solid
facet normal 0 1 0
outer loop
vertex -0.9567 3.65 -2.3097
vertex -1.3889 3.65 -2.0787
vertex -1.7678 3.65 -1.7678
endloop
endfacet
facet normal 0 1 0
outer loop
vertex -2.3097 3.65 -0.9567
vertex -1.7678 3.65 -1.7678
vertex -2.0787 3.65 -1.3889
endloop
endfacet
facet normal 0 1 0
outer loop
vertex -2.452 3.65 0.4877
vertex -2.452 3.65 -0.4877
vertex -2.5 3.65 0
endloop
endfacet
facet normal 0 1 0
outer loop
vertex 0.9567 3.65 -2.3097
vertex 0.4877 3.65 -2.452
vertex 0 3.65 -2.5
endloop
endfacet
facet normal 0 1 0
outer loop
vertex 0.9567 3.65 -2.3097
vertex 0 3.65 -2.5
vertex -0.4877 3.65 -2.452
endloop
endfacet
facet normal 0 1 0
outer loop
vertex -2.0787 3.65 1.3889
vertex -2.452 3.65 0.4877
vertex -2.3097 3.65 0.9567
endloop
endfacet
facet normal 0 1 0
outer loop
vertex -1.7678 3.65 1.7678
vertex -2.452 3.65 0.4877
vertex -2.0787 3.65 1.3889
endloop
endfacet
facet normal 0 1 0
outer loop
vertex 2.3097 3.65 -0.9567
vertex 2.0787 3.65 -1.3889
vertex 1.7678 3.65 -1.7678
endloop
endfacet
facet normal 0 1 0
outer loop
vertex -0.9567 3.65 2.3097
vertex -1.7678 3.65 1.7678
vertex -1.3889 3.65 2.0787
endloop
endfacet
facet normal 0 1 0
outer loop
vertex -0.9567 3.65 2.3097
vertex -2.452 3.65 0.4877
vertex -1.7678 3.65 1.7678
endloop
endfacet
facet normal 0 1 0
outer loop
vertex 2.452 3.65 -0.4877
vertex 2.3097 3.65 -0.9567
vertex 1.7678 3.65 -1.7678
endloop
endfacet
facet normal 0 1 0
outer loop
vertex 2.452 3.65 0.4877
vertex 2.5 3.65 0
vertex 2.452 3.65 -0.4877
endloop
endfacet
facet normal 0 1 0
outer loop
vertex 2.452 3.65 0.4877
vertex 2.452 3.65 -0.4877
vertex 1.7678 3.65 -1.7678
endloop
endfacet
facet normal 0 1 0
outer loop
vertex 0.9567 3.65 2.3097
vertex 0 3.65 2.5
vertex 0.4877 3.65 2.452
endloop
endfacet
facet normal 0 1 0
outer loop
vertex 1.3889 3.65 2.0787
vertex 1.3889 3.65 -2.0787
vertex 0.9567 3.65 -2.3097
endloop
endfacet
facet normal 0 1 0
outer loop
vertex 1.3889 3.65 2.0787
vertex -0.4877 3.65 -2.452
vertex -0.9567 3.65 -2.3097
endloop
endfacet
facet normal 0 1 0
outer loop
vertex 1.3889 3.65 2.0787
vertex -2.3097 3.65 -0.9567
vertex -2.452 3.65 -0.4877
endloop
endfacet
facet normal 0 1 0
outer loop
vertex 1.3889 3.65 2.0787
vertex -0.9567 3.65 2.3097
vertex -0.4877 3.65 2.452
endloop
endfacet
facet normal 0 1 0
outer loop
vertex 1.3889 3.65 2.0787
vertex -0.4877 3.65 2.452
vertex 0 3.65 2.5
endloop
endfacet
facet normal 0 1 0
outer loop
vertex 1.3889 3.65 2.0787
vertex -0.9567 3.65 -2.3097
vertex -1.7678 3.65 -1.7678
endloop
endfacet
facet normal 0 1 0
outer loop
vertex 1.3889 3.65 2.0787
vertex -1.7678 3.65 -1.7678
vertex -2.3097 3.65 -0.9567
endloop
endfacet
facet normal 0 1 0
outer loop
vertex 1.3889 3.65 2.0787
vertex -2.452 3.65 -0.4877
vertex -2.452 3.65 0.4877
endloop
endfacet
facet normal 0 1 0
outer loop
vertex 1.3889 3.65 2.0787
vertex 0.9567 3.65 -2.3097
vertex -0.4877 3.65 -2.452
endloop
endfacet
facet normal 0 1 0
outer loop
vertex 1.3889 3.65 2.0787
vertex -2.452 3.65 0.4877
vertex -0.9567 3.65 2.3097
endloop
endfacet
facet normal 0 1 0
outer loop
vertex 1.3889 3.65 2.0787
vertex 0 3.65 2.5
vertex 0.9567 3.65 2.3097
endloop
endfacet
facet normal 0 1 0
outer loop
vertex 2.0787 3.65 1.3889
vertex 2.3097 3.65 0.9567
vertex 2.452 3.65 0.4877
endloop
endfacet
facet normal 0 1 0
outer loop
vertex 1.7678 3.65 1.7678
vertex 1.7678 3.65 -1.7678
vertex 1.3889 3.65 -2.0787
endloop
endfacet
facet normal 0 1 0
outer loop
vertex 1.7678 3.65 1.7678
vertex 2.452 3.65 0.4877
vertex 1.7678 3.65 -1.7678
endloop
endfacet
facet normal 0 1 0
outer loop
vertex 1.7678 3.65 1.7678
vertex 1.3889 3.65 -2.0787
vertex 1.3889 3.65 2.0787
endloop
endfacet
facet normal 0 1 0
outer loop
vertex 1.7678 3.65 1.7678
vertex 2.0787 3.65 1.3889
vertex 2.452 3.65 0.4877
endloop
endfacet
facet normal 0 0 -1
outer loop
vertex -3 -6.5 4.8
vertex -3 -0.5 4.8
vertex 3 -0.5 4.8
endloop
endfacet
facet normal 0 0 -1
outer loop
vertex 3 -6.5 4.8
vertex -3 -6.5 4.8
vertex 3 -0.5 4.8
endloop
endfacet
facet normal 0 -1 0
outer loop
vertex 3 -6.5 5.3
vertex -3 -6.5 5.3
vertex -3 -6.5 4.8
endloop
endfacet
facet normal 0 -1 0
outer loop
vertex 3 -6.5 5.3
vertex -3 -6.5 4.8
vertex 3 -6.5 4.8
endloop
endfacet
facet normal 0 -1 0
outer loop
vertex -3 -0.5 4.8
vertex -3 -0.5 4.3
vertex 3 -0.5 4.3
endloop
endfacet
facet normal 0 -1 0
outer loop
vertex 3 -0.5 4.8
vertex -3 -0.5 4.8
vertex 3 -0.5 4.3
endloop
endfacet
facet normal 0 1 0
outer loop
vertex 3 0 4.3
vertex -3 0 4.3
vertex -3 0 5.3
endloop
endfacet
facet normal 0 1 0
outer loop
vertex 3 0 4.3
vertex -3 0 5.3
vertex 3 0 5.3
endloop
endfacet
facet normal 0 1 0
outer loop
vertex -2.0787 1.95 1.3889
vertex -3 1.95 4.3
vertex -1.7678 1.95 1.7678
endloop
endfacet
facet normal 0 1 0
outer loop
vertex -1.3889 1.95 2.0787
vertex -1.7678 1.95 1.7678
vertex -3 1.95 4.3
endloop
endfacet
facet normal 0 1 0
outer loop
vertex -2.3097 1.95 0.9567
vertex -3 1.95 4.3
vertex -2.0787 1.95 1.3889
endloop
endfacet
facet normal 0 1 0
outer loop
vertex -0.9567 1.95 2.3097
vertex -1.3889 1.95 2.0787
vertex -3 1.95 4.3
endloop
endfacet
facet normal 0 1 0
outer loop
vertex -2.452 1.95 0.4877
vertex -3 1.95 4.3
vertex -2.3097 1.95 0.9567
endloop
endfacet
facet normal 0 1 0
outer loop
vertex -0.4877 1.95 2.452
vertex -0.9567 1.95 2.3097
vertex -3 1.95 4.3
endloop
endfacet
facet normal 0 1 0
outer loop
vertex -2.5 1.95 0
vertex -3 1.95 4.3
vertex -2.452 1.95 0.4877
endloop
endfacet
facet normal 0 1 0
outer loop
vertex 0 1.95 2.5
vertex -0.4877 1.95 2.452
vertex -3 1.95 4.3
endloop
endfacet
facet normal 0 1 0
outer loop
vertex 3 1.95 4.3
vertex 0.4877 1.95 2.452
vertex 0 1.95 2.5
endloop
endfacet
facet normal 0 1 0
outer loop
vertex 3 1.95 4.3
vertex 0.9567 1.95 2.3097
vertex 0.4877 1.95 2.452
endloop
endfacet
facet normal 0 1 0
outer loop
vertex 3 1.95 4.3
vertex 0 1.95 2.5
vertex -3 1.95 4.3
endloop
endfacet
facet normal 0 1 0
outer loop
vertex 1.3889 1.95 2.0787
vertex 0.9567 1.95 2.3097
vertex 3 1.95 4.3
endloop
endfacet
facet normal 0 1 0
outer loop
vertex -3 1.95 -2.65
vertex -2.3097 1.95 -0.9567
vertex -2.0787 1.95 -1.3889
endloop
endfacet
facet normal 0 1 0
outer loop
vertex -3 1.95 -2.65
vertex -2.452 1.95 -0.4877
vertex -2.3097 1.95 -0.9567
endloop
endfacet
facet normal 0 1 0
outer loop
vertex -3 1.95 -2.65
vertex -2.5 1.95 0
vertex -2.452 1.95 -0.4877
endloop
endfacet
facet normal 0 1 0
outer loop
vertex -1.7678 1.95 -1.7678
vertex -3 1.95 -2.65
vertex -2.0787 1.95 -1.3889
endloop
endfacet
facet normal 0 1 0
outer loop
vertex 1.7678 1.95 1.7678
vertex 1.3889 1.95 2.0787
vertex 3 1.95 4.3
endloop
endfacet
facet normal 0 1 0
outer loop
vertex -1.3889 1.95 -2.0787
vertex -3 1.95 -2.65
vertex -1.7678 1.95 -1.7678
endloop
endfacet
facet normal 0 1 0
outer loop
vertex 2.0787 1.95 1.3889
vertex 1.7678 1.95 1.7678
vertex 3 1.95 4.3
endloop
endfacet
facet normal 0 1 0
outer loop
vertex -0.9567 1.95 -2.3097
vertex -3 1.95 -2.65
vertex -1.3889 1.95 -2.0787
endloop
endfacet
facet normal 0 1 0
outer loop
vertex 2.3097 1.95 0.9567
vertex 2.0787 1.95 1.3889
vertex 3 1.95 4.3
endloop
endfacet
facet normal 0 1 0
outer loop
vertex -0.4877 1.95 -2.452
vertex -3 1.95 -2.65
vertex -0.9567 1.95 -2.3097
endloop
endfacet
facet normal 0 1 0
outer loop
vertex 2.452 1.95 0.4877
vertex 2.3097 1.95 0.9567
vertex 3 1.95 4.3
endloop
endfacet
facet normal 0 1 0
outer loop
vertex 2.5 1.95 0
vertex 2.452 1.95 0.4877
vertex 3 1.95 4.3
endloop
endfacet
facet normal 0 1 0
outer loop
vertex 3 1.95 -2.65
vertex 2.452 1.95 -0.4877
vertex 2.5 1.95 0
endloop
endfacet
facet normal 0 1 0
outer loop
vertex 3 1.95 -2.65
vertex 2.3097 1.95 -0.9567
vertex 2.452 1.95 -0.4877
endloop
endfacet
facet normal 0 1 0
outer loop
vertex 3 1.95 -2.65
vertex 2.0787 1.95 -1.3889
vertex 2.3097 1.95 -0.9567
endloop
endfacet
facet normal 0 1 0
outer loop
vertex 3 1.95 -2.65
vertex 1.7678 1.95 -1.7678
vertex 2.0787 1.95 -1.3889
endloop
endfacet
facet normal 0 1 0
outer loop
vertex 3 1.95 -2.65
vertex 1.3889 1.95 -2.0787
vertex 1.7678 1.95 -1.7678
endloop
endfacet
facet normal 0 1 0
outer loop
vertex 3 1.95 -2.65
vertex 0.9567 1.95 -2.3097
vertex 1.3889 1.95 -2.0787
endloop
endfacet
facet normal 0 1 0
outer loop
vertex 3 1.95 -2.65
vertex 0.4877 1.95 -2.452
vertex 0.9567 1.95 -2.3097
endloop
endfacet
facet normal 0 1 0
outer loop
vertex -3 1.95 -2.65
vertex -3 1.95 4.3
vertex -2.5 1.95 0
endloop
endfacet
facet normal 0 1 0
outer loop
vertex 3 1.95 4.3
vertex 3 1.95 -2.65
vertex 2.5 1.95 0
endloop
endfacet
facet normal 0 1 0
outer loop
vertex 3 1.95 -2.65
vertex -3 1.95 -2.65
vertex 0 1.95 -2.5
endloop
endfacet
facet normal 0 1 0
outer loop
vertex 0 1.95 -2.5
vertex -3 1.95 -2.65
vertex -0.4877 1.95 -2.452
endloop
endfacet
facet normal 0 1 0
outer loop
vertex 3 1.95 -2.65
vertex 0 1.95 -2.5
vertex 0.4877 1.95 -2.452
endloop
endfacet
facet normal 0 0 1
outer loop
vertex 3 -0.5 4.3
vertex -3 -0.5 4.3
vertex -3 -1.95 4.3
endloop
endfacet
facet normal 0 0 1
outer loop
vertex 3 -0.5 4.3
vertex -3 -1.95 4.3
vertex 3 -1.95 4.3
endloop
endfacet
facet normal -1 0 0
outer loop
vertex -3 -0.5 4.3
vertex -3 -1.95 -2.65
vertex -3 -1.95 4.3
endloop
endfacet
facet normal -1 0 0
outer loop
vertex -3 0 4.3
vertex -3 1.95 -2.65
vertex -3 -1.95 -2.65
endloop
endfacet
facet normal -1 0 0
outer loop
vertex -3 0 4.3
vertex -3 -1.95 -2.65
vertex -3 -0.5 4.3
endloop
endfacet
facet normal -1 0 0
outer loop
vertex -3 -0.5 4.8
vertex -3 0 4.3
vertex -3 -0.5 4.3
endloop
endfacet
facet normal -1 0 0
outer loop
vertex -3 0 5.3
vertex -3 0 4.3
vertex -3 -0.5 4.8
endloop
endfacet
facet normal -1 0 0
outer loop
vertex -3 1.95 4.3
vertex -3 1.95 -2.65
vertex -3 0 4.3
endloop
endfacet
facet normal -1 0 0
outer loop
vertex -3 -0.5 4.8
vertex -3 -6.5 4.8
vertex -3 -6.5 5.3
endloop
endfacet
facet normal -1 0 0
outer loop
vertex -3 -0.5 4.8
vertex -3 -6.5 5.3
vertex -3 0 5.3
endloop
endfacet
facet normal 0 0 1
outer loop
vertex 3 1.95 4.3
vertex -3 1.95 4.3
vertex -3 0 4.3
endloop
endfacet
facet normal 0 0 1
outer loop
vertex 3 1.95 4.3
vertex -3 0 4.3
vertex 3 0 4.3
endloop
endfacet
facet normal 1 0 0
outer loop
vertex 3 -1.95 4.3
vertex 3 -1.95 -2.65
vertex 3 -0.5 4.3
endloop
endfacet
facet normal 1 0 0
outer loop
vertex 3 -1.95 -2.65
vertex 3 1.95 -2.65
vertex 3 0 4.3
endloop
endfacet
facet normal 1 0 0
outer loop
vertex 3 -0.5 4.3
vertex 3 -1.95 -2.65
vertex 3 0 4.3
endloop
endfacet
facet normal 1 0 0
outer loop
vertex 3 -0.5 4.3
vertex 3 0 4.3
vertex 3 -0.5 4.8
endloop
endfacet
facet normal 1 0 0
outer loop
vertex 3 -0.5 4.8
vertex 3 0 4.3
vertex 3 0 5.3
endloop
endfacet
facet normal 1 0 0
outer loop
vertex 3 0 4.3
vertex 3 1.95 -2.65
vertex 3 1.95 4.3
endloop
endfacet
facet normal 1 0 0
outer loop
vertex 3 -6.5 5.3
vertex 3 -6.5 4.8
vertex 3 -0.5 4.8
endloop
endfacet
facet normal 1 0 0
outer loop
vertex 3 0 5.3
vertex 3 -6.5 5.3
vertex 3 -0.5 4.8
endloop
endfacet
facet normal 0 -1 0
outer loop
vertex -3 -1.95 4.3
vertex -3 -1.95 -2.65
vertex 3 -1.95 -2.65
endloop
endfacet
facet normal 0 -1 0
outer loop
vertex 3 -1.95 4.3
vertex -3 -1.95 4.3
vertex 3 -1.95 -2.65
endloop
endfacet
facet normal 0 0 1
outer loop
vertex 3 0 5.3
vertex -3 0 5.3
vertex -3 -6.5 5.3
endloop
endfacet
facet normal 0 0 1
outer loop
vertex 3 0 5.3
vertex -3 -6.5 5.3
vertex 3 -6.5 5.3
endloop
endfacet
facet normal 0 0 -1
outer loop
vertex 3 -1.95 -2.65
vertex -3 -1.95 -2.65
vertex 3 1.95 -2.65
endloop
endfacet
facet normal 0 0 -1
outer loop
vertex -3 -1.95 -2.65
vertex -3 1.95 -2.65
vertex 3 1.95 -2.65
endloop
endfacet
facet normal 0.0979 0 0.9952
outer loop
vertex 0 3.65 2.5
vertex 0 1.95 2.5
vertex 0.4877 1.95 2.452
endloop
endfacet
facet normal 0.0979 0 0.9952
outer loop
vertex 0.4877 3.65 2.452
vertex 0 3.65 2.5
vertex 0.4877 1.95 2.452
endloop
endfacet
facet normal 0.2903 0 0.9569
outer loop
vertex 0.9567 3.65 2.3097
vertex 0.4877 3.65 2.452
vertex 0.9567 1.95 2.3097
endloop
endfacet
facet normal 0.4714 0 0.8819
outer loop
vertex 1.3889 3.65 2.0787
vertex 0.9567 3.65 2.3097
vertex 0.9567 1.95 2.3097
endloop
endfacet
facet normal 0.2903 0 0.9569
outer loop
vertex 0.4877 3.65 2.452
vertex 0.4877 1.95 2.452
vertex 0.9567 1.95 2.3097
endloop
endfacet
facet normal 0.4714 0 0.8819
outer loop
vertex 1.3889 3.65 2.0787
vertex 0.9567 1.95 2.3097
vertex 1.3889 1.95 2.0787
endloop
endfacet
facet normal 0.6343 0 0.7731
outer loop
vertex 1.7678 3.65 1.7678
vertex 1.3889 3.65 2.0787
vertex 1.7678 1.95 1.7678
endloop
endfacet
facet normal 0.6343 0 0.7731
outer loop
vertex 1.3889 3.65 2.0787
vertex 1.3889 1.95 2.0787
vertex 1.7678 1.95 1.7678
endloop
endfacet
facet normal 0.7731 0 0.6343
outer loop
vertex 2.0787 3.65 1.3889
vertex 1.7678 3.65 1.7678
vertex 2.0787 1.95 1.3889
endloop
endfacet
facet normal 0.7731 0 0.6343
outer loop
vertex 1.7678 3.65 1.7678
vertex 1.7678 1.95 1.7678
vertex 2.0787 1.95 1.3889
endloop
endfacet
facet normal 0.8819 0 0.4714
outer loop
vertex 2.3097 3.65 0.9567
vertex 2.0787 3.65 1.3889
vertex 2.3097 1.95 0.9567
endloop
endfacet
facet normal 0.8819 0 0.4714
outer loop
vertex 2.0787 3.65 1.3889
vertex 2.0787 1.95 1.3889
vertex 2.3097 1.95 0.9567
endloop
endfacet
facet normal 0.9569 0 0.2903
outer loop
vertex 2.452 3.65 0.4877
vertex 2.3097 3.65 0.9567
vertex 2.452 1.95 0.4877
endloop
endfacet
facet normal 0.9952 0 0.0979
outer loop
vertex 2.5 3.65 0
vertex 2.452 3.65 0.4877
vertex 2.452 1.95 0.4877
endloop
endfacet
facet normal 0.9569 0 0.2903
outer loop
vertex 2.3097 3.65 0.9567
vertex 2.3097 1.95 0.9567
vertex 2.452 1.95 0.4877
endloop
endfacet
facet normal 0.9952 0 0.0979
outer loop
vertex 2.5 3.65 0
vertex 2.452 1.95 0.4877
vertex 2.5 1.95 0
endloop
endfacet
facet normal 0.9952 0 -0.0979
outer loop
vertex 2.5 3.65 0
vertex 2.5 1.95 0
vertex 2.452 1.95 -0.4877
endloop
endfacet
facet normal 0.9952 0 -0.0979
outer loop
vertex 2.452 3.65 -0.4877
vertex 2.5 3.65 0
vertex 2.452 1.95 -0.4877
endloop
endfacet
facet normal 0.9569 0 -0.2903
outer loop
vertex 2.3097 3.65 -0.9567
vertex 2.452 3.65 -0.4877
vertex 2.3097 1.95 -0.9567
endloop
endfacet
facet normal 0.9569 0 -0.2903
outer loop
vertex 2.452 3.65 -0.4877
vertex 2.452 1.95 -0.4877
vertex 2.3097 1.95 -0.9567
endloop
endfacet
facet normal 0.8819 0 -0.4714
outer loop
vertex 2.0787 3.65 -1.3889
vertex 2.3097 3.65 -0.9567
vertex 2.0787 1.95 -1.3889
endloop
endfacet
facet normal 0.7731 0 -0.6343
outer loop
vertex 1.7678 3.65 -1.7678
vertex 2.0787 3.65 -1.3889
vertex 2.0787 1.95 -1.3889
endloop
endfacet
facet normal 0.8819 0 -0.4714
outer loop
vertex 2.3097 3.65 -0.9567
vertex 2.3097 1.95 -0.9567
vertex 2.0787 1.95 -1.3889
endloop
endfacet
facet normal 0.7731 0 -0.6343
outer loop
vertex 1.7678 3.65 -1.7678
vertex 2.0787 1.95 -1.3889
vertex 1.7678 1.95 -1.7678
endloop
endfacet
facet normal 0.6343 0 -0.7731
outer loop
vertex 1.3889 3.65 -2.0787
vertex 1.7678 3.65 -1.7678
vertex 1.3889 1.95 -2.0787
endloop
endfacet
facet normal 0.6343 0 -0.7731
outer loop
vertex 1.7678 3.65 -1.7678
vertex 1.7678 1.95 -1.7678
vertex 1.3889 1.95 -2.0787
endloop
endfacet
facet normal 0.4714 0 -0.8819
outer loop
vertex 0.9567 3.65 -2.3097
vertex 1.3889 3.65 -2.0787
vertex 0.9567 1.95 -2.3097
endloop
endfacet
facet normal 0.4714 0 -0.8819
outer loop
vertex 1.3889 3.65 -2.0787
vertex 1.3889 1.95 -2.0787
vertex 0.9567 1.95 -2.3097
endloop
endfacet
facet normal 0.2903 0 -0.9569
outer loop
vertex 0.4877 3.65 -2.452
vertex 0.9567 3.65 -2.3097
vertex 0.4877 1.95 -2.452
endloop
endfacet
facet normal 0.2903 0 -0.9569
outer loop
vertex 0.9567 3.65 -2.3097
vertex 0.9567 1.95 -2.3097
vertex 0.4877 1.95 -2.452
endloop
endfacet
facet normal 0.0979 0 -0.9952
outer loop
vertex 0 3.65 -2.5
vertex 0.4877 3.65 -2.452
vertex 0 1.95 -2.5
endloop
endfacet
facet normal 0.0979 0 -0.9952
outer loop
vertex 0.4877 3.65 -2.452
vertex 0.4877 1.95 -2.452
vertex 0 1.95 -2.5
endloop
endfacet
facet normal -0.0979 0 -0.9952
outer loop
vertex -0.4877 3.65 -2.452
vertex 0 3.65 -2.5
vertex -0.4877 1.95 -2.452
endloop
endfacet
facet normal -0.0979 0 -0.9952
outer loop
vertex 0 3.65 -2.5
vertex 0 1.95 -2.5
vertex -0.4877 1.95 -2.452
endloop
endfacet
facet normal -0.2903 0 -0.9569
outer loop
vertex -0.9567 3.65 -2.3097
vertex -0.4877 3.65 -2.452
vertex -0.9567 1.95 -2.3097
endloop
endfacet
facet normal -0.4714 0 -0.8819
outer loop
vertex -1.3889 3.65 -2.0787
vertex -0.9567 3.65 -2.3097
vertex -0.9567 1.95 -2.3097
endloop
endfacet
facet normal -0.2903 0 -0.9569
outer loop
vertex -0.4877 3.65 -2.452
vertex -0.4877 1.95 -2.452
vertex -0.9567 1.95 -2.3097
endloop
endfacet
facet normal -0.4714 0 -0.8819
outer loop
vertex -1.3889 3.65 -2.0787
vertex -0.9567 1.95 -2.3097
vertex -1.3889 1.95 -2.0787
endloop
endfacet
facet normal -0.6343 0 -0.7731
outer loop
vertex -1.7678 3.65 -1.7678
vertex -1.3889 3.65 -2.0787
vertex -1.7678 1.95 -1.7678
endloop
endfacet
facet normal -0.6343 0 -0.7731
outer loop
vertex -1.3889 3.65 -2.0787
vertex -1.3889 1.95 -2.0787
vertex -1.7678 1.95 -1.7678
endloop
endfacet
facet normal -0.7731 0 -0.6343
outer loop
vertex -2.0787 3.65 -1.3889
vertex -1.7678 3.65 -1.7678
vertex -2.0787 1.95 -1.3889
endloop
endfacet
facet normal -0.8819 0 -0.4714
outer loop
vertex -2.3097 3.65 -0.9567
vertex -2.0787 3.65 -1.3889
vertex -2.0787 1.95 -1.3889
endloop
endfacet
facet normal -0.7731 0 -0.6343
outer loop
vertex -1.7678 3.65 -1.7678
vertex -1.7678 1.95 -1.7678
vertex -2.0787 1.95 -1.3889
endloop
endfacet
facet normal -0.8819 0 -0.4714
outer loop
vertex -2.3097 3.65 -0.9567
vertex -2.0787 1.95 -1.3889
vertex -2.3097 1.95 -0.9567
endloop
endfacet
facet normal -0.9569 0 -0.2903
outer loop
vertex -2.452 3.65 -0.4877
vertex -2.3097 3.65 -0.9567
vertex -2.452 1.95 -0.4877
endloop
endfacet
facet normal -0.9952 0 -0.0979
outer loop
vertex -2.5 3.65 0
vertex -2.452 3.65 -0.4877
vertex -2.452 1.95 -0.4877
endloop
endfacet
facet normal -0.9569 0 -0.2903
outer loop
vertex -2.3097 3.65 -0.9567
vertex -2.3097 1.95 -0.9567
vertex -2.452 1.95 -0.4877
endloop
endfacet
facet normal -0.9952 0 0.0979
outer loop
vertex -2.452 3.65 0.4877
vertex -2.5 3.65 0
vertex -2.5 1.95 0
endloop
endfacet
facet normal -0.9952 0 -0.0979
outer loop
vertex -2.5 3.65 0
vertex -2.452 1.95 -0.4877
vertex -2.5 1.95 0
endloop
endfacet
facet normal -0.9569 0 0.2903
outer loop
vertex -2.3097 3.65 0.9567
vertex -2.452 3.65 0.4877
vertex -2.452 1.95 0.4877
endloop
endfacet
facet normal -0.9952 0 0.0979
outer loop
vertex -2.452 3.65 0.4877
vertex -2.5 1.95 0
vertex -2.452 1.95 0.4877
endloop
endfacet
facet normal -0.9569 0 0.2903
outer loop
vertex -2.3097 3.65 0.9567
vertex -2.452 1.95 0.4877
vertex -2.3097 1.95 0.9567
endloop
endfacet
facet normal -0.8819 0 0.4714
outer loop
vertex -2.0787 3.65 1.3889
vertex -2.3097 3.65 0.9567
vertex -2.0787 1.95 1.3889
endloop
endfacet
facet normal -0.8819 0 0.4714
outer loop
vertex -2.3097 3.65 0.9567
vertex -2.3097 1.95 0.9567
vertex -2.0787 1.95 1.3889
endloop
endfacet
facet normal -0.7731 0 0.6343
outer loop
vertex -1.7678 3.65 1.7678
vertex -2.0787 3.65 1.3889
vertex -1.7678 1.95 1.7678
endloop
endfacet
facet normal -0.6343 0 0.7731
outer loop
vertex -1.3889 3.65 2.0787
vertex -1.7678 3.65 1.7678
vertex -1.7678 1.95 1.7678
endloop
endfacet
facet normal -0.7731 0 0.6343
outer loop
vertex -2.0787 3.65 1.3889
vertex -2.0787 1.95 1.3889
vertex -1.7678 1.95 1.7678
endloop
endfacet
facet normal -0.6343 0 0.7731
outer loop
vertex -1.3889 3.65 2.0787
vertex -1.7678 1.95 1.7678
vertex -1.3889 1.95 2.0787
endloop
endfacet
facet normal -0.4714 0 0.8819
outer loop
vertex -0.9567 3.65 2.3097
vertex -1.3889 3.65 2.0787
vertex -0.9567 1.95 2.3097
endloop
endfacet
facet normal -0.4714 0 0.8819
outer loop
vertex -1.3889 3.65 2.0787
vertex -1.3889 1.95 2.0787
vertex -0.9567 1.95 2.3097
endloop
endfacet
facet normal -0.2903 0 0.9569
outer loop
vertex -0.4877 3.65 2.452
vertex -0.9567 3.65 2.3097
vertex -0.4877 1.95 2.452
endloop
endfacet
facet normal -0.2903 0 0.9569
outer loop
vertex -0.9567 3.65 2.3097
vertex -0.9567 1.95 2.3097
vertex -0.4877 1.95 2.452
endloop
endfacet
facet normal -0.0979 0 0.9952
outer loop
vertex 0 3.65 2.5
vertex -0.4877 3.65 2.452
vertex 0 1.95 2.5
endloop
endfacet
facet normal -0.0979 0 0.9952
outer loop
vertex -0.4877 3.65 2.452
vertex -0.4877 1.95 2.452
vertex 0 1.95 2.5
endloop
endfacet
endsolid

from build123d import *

# Parameters (mm, degrees)
SKETCH1_W           = 6
SKETCH1_H           = 6.95
BOSS_EXTRUDE1_DEPTH = 1.95
SKETCH2_R           = 2.5
BOSS_EXTRUDE2_DEPTH = 1.7
SKETCH3_W           = 6
SKETCH3_H           = 0.5
BOSS_EXTRUDE3_DEPTH = 1
SKETCH4_W           = 6
SKETCH4_H           = 0.5
BOSS_EXTRUDE4_DEPTH = 6


with BuildPart() as part:
    # Sketch1 → Boss-Extrude1 (new, symmetric)
    with BuildSketch(Plane(origin=(0, 0, 0), x_dir=(1, 0, 0), z_dir=(0, 1, 0))):
        with Locations((0, -0.825)):
            Rectangle(SKETCH1_W, SKETCH1_H)
    extrude(amount=BOSS_EXTRUDE1_DEPTH, both=True)

    # Sketch2 → Boss-Extrude2 (add)
    with BuildSketch(Plane(origin=(0, 1.95, 0), x_dir=(1, 0, 0), z_dir=(0, 1, 0))):
        with Locations(Location((0, 0, 0), (0, 0, 270))):
            Circle(SKETCH2_R)
    extrude(amount=BOSS_EXTRUDE2_DEPTH)

    # Sketch3 → Boss-Extrude3 (add)
    with BuildSketch(Plane.XY.offset(4.3)):
        with Locations((0, -0.25)):
            Rectangle(SKETCH3_W, SKETCH3_H)
    extrude(amount=BOSS_EXTRUDE3_DEPTH)

    # Sketch4 → Boss-Extrude4 (add)
    with BuildSketch(Plane.XZ.offset(0.5)):
        with Locations((0, 5.05)):
            Rectangle(SKETCH4_W, SKETCH4_H)
    extrude(amount=BOSS_EXTRUDE4_DEPTH)


solid = part.part
